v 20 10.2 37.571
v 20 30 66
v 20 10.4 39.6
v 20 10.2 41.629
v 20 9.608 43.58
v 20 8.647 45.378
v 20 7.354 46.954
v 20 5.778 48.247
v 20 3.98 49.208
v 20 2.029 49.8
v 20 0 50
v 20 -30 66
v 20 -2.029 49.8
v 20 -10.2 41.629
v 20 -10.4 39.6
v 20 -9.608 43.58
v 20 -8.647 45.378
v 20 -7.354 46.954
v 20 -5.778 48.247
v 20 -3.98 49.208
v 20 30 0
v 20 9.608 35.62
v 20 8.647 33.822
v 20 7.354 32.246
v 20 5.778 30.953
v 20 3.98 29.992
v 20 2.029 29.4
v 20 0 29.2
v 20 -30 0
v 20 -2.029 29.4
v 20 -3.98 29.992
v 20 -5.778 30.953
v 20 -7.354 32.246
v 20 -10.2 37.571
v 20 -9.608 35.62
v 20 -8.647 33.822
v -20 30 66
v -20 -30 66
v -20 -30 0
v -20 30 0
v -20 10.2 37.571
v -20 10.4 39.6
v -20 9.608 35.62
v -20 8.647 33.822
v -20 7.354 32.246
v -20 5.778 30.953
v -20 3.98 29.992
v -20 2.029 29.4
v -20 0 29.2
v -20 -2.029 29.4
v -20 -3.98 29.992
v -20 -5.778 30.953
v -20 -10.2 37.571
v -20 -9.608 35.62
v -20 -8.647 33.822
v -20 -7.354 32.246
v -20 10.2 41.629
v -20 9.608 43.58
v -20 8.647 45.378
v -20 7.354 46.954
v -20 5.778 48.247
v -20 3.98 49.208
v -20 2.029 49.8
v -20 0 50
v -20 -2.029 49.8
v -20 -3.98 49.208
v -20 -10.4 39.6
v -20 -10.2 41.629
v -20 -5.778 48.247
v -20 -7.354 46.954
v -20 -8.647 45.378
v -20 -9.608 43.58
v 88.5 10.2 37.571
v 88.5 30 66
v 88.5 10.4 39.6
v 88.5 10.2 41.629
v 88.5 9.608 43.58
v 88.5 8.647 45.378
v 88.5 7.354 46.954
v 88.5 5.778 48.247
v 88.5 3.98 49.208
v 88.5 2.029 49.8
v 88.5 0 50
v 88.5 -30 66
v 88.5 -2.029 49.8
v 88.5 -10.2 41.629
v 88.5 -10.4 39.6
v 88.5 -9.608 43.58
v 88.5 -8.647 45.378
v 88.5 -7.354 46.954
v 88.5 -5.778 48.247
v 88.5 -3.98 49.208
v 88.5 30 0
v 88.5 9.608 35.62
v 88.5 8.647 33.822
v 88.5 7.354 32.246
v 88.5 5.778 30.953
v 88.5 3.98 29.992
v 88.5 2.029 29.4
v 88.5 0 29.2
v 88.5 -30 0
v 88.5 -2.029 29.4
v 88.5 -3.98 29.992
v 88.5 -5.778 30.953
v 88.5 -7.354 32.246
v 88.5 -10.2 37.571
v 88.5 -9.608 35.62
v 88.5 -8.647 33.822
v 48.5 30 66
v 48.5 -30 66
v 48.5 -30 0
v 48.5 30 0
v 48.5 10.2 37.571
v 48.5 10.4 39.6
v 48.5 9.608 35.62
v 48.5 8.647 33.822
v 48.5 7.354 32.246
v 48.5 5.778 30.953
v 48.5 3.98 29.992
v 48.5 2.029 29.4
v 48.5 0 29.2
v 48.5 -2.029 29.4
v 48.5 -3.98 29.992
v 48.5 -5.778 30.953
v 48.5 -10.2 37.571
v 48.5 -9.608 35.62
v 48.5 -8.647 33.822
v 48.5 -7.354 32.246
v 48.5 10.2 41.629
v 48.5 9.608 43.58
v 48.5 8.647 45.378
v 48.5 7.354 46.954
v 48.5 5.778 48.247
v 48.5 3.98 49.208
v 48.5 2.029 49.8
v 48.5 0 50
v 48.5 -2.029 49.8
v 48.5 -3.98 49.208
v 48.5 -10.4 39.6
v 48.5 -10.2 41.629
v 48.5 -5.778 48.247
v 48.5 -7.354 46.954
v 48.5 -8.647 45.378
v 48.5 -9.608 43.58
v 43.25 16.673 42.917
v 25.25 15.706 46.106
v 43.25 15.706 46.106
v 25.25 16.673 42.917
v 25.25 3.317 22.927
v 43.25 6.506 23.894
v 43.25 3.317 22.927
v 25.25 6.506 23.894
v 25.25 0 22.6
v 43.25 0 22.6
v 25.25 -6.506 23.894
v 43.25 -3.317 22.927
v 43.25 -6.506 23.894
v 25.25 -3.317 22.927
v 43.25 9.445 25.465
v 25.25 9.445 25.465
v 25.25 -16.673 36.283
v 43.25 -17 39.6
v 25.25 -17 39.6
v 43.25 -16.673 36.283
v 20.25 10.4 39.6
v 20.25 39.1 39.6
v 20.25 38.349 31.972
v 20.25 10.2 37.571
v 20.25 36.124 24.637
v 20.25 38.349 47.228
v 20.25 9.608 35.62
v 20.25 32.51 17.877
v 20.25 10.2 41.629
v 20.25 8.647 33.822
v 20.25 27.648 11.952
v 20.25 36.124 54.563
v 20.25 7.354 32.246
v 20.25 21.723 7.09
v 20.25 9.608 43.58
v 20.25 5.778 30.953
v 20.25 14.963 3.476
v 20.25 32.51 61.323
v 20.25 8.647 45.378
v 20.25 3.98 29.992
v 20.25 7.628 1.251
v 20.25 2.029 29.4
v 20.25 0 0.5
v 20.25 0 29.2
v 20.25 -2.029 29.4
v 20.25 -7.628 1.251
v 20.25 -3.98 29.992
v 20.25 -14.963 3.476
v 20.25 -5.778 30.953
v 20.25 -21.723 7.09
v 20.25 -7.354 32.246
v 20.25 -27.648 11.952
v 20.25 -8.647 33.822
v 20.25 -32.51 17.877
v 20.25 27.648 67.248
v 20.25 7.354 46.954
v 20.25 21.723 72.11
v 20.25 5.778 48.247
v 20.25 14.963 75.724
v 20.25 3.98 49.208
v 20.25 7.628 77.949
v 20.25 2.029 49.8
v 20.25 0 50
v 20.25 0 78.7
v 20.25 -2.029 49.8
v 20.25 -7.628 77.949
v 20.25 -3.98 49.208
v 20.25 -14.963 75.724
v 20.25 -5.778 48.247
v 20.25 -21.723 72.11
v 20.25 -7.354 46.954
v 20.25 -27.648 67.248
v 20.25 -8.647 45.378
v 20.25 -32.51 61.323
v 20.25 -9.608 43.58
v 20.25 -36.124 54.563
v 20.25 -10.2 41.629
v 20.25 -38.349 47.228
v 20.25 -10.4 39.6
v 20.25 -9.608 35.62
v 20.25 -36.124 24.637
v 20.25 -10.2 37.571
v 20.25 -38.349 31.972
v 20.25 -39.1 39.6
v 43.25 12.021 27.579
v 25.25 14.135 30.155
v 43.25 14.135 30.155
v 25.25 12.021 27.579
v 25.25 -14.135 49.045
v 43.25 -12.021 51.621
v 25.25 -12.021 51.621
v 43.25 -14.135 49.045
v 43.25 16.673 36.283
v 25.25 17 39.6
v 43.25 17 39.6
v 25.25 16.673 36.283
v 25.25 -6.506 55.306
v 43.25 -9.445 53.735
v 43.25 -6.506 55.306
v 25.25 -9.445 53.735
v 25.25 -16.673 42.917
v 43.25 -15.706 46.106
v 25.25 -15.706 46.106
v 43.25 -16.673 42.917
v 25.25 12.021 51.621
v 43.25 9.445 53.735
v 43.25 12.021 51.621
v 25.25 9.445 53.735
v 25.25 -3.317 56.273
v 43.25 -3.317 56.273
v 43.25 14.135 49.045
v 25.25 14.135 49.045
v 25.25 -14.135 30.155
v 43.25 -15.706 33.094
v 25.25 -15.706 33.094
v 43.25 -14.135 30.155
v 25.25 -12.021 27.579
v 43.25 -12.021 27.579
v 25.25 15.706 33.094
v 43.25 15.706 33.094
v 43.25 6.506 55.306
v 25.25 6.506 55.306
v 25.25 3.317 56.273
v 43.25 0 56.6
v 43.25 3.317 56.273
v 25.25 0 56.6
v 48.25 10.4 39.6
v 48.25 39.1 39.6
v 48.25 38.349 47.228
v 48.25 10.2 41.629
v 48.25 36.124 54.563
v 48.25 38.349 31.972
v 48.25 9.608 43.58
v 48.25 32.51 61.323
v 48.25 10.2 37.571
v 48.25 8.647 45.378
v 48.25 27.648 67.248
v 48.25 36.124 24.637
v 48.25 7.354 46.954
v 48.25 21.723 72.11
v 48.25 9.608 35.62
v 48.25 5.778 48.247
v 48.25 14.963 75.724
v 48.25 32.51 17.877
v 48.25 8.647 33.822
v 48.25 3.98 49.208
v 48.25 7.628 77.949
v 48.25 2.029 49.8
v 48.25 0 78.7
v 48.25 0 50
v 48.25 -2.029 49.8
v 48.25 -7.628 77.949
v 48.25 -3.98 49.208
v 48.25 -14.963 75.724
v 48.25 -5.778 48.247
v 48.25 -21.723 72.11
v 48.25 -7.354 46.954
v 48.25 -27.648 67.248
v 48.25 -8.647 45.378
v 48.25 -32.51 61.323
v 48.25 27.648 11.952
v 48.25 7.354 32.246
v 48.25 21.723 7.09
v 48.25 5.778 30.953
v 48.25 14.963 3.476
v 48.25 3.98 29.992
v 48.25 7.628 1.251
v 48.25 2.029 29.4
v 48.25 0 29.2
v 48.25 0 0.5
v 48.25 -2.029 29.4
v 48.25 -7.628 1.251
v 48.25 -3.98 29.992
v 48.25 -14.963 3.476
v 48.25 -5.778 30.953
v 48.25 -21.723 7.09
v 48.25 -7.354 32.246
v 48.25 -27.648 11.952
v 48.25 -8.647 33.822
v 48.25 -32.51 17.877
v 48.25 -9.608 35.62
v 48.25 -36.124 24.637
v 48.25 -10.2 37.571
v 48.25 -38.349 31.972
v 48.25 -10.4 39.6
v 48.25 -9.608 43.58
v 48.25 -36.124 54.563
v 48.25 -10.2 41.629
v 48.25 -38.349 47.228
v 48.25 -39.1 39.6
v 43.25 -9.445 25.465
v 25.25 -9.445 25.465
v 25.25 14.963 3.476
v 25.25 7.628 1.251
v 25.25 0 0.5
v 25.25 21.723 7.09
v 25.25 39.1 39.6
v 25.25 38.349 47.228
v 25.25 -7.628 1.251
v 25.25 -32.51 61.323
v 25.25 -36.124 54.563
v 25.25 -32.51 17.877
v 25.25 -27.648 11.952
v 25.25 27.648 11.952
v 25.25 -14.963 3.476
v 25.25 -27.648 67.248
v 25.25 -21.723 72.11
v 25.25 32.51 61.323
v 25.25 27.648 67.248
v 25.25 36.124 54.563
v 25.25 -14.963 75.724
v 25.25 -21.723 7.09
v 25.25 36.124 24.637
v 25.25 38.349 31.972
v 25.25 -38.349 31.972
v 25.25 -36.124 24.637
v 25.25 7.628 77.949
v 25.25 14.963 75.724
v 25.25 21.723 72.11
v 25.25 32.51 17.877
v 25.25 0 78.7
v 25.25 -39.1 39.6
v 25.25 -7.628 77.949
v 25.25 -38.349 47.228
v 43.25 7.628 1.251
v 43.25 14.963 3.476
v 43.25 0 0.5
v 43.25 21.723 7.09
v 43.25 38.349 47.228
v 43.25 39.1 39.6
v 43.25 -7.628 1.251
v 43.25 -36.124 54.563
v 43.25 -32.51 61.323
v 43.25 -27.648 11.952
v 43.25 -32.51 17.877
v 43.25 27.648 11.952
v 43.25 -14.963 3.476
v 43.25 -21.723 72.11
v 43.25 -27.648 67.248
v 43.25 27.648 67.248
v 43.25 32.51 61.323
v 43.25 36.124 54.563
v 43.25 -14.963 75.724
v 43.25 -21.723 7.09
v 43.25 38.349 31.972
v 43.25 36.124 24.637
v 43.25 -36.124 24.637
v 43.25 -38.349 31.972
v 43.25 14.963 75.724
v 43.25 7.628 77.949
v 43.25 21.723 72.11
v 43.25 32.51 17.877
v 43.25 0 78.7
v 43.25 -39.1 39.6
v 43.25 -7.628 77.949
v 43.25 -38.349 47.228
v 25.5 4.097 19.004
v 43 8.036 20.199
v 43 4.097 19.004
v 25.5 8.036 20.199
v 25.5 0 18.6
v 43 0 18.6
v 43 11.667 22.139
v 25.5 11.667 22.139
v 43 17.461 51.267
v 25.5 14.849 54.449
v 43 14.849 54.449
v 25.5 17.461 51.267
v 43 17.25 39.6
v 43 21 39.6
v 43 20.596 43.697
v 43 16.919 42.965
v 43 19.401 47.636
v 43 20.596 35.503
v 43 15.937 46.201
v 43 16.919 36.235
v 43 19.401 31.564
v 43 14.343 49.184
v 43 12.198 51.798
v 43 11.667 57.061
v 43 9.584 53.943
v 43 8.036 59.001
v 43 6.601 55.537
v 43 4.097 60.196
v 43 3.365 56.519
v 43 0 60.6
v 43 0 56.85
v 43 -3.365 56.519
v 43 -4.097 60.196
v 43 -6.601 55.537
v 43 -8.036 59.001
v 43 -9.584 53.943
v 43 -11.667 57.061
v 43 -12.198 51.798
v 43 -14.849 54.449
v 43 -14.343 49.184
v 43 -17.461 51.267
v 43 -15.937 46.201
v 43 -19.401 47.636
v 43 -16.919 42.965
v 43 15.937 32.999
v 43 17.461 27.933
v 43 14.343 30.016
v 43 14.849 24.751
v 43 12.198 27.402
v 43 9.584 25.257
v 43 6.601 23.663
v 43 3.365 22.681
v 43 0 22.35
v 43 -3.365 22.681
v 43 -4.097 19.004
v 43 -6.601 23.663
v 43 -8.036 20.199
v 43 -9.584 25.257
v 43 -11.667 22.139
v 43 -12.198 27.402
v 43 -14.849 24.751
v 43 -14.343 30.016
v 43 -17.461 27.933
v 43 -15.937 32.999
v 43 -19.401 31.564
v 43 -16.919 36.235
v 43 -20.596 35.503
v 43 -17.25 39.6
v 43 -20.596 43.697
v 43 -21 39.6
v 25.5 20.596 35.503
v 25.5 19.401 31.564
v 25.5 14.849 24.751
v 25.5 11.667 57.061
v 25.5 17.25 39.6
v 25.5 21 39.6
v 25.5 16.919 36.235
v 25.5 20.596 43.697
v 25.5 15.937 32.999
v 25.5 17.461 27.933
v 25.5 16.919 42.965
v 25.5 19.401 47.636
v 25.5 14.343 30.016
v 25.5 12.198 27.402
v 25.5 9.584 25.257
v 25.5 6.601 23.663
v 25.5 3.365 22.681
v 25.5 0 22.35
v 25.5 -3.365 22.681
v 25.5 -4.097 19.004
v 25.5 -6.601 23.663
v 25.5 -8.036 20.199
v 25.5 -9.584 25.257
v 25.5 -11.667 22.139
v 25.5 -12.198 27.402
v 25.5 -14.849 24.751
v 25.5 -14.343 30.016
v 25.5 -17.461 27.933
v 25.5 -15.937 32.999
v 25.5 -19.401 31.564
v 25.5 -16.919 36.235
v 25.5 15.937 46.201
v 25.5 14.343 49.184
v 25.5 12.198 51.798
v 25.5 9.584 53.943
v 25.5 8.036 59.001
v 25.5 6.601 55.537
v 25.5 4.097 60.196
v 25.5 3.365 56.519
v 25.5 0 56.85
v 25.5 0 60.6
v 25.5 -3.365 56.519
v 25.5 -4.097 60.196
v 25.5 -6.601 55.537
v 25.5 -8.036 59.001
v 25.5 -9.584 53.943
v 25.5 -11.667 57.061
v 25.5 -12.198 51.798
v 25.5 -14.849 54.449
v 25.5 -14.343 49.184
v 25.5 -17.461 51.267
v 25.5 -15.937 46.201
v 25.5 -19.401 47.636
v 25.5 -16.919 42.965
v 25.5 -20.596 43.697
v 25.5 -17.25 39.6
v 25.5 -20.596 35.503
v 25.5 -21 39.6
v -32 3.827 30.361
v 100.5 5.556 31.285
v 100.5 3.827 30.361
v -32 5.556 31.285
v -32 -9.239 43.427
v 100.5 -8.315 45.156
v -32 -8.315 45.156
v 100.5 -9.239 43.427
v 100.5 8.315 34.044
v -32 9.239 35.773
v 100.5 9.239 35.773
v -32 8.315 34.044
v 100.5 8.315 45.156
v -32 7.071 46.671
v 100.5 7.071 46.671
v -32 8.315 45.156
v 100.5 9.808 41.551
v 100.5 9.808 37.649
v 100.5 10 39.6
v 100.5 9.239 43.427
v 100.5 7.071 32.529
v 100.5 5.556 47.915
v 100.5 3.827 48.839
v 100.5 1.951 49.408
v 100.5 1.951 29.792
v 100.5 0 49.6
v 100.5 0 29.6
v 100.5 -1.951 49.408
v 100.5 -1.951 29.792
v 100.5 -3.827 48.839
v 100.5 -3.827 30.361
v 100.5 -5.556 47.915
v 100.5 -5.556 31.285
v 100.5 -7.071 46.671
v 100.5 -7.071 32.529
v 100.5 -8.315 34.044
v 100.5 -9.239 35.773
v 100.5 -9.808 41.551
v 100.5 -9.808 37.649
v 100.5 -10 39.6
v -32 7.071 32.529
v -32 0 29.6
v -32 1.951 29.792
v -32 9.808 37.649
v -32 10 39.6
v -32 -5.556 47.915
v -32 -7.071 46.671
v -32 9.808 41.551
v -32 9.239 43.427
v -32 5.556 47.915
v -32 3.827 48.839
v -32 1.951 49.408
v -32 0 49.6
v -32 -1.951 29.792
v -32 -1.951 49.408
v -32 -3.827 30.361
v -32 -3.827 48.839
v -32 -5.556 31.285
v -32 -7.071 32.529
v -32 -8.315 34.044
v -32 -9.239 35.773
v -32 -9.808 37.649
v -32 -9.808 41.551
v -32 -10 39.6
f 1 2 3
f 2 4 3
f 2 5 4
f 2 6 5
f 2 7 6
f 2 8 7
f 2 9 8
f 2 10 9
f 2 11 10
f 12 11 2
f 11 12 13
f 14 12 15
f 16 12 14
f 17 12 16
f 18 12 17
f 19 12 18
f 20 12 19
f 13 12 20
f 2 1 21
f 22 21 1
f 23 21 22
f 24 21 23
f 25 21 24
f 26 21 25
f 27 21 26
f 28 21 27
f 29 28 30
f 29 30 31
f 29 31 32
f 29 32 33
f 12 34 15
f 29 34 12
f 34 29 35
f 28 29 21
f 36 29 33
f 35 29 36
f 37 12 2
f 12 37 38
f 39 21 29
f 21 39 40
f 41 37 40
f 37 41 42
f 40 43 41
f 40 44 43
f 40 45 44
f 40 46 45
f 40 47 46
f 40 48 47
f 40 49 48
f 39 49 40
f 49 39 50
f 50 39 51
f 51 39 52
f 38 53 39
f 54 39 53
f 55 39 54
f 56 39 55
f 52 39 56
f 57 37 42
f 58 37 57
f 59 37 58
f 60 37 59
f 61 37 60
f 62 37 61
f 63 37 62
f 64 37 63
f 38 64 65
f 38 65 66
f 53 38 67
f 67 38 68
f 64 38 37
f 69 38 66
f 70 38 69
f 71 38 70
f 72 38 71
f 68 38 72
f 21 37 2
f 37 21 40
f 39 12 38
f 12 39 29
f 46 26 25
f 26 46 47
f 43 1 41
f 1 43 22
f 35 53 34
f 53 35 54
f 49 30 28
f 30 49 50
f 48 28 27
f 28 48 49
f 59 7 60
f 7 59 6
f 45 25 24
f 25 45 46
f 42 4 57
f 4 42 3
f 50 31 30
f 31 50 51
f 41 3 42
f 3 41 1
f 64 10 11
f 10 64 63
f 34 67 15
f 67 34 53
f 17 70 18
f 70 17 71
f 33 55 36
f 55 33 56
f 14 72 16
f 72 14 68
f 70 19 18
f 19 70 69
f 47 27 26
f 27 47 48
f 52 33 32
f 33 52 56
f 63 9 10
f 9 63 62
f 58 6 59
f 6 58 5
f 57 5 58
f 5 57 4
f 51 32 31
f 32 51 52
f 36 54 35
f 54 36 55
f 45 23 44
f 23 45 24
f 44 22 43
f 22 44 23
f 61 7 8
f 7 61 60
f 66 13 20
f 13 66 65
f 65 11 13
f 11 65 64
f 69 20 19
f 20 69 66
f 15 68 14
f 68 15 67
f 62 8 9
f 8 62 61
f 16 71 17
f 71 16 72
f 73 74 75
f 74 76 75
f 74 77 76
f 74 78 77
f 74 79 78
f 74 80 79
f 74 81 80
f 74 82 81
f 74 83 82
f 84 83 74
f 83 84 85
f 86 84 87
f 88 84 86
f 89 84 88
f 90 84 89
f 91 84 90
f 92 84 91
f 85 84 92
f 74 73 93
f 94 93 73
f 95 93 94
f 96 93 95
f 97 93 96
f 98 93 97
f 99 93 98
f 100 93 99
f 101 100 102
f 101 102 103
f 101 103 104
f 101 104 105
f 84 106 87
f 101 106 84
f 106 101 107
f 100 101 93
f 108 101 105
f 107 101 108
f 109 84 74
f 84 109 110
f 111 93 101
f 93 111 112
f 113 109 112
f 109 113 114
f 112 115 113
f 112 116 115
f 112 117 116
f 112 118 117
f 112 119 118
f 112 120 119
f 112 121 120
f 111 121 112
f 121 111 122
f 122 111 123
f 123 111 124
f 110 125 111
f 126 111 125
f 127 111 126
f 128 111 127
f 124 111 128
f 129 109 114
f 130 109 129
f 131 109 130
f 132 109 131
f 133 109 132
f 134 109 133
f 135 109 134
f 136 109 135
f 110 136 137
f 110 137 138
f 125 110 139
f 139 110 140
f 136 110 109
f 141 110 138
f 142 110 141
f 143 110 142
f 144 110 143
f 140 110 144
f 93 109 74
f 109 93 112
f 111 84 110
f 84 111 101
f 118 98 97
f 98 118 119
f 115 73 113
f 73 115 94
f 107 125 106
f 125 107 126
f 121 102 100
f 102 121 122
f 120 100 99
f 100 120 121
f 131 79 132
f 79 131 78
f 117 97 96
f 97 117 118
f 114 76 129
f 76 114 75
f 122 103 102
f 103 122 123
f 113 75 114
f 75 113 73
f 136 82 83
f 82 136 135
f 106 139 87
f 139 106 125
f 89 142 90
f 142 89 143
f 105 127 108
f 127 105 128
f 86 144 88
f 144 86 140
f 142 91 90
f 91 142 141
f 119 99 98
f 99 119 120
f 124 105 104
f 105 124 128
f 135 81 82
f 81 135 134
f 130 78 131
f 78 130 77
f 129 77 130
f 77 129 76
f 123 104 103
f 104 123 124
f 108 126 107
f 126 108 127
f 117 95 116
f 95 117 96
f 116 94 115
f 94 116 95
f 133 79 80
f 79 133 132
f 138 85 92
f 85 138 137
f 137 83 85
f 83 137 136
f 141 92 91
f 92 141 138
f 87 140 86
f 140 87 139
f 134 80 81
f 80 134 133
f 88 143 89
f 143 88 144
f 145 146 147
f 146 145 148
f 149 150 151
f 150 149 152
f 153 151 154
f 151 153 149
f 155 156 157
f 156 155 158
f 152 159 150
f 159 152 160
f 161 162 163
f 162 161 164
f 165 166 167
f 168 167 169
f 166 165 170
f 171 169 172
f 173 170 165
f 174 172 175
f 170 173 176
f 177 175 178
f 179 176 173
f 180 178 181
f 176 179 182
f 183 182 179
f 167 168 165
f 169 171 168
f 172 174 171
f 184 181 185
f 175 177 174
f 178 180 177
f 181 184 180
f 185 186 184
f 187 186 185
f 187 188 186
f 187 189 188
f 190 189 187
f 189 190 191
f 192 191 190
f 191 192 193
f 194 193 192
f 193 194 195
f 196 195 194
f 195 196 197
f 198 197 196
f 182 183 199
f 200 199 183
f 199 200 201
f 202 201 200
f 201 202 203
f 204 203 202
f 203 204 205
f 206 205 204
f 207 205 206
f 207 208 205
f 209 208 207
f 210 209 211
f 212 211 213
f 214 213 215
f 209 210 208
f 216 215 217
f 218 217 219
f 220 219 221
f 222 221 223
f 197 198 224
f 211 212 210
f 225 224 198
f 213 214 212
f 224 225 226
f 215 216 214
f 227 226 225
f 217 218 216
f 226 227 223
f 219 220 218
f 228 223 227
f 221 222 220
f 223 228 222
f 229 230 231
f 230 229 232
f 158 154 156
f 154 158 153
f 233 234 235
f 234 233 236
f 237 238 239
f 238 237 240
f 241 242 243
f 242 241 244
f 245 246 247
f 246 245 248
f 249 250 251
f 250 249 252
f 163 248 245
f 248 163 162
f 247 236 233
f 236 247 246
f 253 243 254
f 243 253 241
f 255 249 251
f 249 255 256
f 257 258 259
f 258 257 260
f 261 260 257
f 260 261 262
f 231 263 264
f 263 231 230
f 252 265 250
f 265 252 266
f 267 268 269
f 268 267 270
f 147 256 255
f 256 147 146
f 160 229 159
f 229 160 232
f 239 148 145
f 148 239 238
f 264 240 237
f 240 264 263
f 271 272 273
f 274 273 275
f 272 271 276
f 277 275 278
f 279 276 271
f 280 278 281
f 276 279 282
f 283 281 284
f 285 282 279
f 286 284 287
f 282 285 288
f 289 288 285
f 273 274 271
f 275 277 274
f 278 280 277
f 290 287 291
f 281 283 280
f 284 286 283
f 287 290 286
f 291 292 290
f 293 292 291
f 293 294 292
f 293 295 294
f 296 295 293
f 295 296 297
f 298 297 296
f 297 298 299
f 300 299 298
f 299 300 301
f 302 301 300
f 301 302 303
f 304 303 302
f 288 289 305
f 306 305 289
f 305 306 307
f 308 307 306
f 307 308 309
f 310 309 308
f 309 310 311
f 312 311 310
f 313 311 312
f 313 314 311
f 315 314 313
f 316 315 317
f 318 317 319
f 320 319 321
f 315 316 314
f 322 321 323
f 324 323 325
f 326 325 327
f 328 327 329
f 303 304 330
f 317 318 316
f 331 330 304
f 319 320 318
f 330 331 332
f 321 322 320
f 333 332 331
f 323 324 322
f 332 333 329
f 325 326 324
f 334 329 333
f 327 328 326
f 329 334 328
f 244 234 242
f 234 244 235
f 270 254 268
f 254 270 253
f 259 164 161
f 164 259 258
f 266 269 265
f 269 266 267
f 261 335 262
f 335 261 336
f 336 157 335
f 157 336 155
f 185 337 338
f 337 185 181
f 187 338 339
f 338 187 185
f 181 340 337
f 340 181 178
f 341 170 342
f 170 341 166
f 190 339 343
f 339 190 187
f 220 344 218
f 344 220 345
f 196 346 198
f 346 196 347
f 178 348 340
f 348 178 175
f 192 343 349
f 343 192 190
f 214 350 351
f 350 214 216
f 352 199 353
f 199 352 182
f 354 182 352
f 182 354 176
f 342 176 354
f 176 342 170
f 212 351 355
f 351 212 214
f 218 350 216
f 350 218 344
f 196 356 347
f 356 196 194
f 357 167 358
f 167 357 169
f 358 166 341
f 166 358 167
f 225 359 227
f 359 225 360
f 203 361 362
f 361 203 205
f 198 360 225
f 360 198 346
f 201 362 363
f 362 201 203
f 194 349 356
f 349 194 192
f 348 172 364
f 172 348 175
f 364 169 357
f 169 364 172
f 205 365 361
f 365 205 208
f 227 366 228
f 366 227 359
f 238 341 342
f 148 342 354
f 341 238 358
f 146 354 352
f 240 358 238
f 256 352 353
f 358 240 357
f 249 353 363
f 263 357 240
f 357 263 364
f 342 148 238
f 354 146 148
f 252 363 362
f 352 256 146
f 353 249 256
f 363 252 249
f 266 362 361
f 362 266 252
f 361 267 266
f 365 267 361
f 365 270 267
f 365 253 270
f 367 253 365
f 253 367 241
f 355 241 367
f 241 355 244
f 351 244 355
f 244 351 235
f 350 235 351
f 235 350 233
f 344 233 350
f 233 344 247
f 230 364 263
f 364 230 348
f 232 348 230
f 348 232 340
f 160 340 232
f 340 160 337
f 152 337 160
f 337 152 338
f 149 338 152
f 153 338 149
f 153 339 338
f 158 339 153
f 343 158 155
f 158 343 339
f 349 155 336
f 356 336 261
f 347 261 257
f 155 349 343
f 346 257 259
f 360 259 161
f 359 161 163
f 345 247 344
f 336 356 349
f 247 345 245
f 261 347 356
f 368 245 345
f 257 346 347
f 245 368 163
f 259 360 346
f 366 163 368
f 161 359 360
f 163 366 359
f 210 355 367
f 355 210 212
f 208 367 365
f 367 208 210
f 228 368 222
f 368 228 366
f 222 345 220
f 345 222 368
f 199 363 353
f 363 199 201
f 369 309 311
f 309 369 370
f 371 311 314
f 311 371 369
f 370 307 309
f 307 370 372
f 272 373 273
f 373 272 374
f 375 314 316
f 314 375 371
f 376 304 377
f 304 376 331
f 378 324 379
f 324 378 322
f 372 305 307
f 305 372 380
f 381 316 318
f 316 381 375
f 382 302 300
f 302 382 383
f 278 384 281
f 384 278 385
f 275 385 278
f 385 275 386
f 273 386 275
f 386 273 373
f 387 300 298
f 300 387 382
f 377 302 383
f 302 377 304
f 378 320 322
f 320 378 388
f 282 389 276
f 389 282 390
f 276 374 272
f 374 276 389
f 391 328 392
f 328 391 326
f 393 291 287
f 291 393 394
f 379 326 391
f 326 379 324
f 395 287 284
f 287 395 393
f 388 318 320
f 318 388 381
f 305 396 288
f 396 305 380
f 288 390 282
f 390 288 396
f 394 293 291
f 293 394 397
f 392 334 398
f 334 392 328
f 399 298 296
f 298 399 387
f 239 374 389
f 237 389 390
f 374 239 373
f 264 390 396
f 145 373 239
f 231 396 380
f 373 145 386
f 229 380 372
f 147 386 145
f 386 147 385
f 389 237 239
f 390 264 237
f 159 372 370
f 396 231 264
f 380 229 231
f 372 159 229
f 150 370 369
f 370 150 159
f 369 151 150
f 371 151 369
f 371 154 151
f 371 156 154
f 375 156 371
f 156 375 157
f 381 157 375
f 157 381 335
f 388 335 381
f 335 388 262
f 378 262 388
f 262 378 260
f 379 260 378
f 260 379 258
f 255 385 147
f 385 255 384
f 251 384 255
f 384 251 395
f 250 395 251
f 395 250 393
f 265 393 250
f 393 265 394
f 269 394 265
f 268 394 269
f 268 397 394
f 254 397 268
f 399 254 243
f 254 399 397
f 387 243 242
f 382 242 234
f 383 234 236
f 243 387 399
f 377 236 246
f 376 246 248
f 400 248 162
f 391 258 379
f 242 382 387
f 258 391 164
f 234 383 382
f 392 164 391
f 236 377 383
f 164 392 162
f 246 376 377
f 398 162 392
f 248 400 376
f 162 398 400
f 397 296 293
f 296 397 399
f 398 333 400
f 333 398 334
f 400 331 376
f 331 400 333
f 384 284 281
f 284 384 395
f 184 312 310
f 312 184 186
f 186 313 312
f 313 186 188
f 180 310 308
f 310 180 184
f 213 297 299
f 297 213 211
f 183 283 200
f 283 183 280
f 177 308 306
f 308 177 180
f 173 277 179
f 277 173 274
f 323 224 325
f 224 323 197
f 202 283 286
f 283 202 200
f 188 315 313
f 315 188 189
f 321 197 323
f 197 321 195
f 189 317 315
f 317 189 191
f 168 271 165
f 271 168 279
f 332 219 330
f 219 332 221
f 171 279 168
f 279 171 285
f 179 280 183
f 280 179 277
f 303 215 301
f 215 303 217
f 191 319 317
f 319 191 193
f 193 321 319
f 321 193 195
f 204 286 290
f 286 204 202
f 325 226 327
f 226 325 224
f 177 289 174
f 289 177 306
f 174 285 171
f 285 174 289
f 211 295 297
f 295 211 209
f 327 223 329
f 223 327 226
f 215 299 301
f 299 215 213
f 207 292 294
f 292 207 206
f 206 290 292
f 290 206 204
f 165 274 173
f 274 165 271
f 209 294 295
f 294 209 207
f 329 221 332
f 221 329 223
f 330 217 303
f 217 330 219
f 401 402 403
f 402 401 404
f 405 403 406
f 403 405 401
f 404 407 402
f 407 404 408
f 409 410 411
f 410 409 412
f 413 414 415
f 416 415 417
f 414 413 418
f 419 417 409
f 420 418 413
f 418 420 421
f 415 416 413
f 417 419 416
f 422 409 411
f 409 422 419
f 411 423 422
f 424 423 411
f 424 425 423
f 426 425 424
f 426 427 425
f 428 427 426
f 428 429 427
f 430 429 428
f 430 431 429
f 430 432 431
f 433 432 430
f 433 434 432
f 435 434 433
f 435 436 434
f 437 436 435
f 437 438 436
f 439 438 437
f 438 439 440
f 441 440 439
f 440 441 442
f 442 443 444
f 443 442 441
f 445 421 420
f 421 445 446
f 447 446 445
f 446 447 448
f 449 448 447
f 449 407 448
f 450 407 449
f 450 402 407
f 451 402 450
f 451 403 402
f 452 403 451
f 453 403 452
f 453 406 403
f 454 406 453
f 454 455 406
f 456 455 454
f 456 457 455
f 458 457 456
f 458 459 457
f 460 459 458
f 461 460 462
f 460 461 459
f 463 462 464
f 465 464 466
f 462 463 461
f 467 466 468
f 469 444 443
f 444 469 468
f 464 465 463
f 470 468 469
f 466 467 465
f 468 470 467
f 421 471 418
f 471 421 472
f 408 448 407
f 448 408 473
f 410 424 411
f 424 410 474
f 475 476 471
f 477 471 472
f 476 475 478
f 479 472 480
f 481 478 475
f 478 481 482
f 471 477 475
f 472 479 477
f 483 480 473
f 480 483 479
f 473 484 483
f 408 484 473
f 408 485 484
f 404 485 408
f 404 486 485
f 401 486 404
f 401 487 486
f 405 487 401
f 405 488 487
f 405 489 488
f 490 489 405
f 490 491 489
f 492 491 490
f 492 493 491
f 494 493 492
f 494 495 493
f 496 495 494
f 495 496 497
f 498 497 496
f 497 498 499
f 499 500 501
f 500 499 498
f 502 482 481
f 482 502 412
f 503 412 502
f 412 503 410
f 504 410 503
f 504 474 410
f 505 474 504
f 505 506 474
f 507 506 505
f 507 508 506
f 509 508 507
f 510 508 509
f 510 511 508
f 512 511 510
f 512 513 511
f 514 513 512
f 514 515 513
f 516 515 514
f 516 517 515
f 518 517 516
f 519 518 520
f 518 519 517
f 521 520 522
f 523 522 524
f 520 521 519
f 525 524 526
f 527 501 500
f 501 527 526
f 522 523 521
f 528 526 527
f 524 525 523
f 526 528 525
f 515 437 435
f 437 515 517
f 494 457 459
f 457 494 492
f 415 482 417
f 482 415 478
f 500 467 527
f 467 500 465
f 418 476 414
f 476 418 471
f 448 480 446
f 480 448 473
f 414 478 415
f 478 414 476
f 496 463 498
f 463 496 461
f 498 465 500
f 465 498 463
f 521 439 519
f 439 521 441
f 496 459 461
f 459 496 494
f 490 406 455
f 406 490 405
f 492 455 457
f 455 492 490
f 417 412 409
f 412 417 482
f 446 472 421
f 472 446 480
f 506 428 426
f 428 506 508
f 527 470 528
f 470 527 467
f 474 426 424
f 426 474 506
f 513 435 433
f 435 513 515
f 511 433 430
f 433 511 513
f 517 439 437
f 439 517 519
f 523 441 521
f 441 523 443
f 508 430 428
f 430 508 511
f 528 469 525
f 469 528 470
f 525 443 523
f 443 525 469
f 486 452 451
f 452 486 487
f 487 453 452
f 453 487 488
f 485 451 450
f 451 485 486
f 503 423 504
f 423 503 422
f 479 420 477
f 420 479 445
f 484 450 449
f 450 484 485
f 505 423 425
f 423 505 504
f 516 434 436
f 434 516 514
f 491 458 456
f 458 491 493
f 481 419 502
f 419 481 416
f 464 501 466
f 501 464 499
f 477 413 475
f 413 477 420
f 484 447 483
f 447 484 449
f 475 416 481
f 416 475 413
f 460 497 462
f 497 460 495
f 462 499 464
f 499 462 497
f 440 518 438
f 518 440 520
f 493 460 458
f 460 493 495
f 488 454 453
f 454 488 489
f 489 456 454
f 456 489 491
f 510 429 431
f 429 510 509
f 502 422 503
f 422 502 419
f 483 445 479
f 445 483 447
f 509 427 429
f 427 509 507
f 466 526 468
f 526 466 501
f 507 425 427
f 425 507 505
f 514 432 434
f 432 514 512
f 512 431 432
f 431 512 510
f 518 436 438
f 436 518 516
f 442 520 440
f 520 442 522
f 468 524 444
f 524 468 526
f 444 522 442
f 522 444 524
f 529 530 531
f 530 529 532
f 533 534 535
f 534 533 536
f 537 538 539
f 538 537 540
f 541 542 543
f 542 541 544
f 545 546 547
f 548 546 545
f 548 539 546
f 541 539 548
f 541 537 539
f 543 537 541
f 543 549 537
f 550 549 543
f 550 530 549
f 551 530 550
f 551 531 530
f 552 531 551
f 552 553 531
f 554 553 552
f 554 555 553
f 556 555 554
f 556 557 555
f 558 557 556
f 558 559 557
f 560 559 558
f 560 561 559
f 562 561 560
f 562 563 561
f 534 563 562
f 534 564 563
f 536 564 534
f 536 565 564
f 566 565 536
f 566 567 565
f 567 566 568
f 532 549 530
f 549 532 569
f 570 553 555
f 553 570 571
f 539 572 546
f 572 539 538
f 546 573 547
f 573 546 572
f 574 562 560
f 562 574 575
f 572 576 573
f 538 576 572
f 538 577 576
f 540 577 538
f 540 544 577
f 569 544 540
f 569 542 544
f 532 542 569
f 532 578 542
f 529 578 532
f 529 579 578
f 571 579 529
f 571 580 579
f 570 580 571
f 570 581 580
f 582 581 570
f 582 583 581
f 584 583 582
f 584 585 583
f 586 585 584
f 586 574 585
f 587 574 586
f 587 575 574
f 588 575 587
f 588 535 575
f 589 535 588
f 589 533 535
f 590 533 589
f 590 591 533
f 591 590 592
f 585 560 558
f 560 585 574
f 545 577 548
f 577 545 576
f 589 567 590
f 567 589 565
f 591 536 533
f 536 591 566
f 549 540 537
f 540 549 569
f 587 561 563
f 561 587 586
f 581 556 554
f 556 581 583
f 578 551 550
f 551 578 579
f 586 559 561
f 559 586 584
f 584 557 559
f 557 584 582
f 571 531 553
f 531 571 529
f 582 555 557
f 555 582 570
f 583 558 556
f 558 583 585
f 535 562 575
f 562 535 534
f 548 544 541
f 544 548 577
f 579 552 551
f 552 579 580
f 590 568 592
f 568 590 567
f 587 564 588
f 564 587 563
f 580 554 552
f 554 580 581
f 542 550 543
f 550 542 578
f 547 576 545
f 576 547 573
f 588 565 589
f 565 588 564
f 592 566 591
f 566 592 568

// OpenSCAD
$fn = 32;

// ------------------------------------------------------------------------
// Pulley assembly: d78.2 pulley with a belt, shaft d20
// Every part is its own module, assembly() places them once.
// ------------------------------------------------------------------------

// --- part 1 ---
module support1() {
  difference() {
    translate([-20, -30, 0]) cube([40, 60, 66]);
    translate([0, 0, 39.6]) rotate([0, 90, 0]) cylinder(h = 42, d = 20.8, center = true);
  }
}

// --- part 2 ---
module support2() {
  difference() {
    translate([-20, -30, 0]) cube([40, 60, 66]);
    translate([0, 0, 39.6]) rotate([0, 90, 0]) cylinder(h = 42, d = 20.8, center = true);
  }
}

// --- part 3 ---
module shaft() {
  translate([0, 0, -66.25]) cylinder(h = 132.5, d = 20);
}

// --- part 4 ---
module pulley() {
  difference() {
    union() {
      cylinder(h = 28, d = 34);
      cylinder(h = 5, d = 78.2);
      translate([0, 0, 23]) cylinder(h = 5, d = 78.2);
    }
    translate([0, 0, -1]) cylinder(h = 30, d = 20.8);
  }
}

// --- part 5 ---
module belt() {
  difference() {
      translate([0, 0, 0]) cylinder(h = 17.5, d = 42);
      translate([0, 0, -1]) cylinder(h = 19.5, d = 34.5);
    }
}

// --- assembly ---
module assembly() {
  translate([0, 0, 0]) rotate([0, 0, 0]) support1();
  translate([68.5, 0, 0]) rotate([0, 0, 0]) support2();
  translate([34.25, 0, 39.6]) rotate([0, 90, 0]) shaft();
  translate([20.25, 0, 39.6]) rotate([0, 90, 0]) pulley();
  translate([25.5, 0, 39.6]) rotate([0, 90, 0]) belt();
}

assembly();
